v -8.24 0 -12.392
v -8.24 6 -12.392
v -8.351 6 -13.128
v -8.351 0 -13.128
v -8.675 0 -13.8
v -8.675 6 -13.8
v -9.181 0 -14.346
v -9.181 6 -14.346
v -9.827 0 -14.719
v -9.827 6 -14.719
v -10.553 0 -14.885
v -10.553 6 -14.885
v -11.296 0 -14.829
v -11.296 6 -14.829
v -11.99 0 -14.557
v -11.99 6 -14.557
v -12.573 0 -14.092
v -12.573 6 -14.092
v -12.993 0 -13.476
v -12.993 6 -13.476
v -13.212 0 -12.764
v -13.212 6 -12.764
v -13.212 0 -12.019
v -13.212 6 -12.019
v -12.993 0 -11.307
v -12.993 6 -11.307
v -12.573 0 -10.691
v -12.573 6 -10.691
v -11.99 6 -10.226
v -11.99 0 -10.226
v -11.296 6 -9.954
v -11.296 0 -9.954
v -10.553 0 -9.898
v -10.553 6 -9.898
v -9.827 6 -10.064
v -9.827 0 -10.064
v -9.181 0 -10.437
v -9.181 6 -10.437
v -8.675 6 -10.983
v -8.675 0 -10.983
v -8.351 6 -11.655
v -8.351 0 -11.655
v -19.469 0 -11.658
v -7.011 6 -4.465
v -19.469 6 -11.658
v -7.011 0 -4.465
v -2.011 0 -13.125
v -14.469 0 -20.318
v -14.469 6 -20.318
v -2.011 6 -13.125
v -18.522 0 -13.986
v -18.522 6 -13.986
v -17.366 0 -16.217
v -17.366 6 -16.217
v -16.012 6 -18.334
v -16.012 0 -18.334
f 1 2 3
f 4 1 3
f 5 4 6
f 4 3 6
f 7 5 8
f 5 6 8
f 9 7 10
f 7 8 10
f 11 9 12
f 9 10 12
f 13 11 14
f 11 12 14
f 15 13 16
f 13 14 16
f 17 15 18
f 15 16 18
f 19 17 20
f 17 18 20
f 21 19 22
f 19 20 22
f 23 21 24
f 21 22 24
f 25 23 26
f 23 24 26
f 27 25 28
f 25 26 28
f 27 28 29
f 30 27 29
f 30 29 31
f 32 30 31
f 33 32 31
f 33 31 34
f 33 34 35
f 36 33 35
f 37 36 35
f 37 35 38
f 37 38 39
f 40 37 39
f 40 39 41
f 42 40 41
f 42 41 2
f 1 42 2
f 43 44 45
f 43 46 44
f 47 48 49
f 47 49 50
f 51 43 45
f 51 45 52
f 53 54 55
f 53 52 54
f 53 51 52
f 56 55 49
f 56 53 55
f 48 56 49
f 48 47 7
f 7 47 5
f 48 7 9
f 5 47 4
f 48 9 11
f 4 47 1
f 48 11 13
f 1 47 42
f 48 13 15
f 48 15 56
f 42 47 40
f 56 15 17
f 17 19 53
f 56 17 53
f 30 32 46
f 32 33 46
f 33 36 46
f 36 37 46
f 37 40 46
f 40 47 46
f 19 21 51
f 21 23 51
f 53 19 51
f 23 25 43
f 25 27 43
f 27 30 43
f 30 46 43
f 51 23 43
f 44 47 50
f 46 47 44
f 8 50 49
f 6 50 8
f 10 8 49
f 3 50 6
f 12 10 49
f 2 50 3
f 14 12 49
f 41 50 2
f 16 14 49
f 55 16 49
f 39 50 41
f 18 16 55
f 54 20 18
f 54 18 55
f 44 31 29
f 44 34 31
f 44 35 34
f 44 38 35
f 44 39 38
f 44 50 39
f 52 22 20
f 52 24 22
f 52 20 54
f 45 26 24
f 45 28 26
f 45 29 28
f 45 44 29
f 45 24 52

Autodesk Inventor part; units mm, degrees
ref_plane "YZ Plane" through (0, 0, 0) normal (1, 0, 0) x (0, 1, 0)
ref_plane "XZ Plane" through (0, 0, 0) normal (0, 1, 0) x (-1, 0, 0)
ref_plane "XY Plane" through (0, 0, 0) normal (0, 0, 1) x (1, 0, 0)
sketch "Sketch7" plane through (0, 0, 0) normal (0, 1, 0) x (-1, 0, 0)
  circle A0 centre (-6.4493, -2.4672) radius 27.5
  circle A1 centre (-6.4493, -2.4672) radius 3.05
  line L0 (-6.4493, -2.4672) -> (-6.4493, 25.0328)
  line L1 (-11.4493, 39.8773) -> (-1.4493, 39.8773)
  line L2 (-1.4493, 39.8773) -> (-1.4493, 10.1882)
  line L3 (-1.4493, 10.1882) -> (-11.4493, 10.1882)
  line L4 (-11.4493, 10.1882) -> (-11.4493, 39.8773)
  line L5 (-11.4493, 39.8773) -> (-1.4493, 10.1882) construction
  line L6 (-1.4493, 39.8773) -> (-11.4493, 10.1882) construction
  line L7 (-45.6207, -19.3094) -> (-19.9093, -4.4649)
  line L8 (-19.9093, -4.4649) -> (-14.9093, -13.1251)
  line L9 (-14.9093, -13.1251) -> (-40.6207, -27.9696)
  line L10 (27.7221, -27.9696) -> (2.0107, -13.1251)
  line L11 (2.0107, -13.1251) -> (7.0107, -4.4649)
  line L12 (7.0107, -4.4649) -> (32.7221, -19.3094)
  point P0 (0, 0)
  point P1 (14.4694, -20.3182)
  point P2 (19.4694, -11.6579)
  dimension "d8" = 360
extrude "Extrusion2" add sketch "Sketch7" along normal blind 6 contours A0 L10 L11 L12
sketch "Sketch8" plane through (0, 6, 0) normal (0, 1, 0) x (1, 0, 0)
  arc A0 (-14.4694, 20.3182) -> (-19.4694, 11.6579) centre (6.4493, 2.4672) ccw projected
  line L0 (-19.4694, 11.6579) -> (-7.0107, 4.4649) projected
  line L1 (-14.4694, 20.3182) -> (-19.4694, 11.6579)
  circle A1 centre (-10.7401, 12.3915) radius 2.5
  point P0 (0, 0)
  dimension "d11" = 5
extrude "Extrusion3" cut sketch "Sketch8" against normal through all contours A1
sketch "Sketch12" plane through (0, 0, 0) normal (0, -1, 0) x (1, 0, 0)
  line L0 (-2.0107, -13.1251) -> (-14.4694, -20.3182) projected
  line L1 (-19.4694, -11.6579) -> (-7.0107, -4.4649) projected
  line L2 (-14.4694, -20.3182) -> (-19.4694, -11.6579)
  point P0 (0, 0)
equation "\"BendRadius\" = Thickness"
equation "\"BendReliefWidth\" = Thickness"
equation "\"BendReliefDepth\" = 0.5 * Thickness"
equation "\"CornerReliefSize\" = 4 * Thickness"
equation "\"MinimumRemnant\" = 2 * Thickness"
equation "\"TransitionRadius\" = BendRadius"
equation "\"JacobiRadiusSize\" = BendRadius"
equation "\"GapSize\" = Thickness"
equation "\"Thickness\" = 0.5"
